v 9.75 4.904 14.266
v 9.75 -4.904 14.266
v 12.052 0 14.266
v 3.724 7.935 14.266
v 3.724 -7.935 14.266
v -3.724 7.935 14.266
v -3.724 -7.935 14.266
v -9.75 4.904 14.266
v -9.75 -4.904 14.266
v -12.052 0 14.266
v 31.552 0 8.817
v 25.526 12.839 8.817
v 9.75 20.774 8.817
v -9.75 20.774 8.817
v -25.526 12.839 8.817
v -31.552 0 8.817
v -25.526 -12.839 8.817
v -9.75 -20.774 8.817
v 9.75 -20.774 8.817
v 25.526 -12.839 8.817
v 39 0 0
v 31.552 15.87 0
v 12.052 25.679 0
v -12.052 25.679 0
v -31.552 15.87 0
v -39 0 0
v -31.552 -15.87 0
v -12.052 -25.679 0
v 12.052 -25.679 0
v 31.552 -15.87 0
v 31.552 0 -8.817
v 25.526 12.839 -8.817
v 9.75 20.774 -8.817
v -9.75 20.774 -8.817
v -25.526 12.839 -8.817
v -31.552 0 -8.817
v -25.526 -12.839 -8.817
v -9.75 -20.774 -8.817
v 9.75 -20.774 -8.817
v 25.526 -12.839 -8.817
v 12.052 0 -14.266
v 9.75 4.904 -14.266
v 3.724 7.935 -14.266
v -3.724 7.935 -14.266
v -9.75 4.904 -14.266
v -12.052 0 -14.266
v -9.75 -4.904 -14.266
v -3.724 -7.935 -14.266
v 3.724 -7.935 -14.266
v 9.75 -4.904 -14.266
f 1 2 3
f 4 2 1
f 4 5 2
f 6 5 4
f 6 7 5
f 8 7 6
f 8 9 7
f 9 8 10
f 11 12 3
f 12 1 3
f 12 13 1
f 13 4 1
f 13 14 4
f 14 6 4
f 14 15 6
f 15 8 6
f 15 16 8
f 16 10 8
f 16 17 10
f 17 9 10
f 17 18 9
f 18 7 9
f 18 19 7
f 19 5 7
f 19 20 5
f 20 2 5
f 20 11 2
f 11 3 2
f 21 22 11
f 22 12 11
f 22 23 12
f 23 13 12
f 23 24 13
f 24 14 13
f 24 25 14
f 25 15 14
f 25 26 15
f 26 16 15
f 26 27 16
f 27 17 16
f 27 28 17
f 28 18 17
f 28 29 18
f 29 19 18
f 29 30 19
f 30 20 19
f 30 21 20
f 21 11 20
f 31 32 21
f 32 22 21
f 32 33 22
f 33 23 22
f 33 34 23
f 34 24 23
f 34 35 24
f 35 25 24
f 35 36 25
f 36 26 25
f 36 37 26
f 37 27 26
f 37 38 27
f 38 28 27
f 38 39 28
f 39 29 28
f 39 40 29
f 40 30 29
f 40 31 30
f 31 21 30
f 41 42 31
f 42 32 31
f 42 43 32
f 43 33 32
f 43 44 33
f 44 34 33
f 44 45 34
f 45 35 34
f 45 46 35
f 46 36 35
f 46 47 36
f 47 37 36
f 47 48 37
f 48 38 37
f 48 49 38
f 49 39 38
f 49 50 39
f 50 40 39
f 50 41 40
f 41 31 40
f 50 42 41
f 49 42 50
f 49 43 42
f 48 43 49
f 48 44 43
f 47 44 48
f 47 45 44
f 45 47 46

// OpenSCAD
// Generated by SolidPython 1.0.1 on 2020-07-29 00:46:50


scale(v = [13, 9, 5]) {
	sphere(r = 3);
}
/***********************************************
*********      SolidPython code:      **********
************************************************
 
# import packages: SolidPython
from solid import *
from solid.utils import *
from itertools import chain, combinations, permutations


class Resize:

    def __init__(self, scad_file):
        self.scad_file = scad_file
        #self.scad_file = import_scad(scad_file)
        # cone/cylinder param:
        self.r1 = 0
        self.r2 = 0
        self.h = 0
        # rectangular prism param:
        self.w = 0
        self.l = 0
        # ellipse param:
        self.r = 0

    # import OpenScad code (file name corresponds to shape)


    # classify shape + parameters
    def assign(self, param1, param2, param3):
        if self.scad_file == 'cone.scad':
            self.r1 = param1
            self.r2 = param2
            self.h = param3
        elif self.scad_file == 'cylinder.scad':
            self.r1 = param1
            self.r2 = param2
            self.h = param3
        elif self.scad_file == 'rectangularPrism.scad':
            self.h = param1
            self.l = param2
            self.w = param3
        else:
            self.r = param1
            self.h = param2

    # resize parameters
    def iterate(self):
        x = range(3, 20, 2)
        i = 1
        if self.scad_file == 'cone.scad':
            tempList = list(permutations(x, 2))
            for temp in tempList:
                param1 = temp[0]
                param2 = temp[1]
                filepath = 'produced_scad_files/' + 'cone' + str(param1) + '_' + str(param2) + '_' + '.scad'
                scad_render_to_file(cylinder(h=param1, r1=param2, r2=0), filepath)

        elif self.scad_file == 'cylinder.scad':
            tempList = list(permutations(x, 3))
            for temp in tempList:
                param1 = temp[0]
                param2 = temp[1]
                filepath = 'produced_scad_files/' + 'cylinder' + str(param1) + '_' + str(param2) + '_' + '.scad'
                scad_render_to_file(cylinder(h=param1, r1=param2, r2=param2), filepath)

        elif self.scad_file == 'rectangularPrism.scad':
            tempList = list(permutations(x, 3))
            for temp in tempList:
                param1 = temp[0]
                param2 = temp[1]
                param3 = temp[2]
                filepath = 'produced_scad_files/' + 'rectangularPrism' + str(param1) + '_' + str(param2) + '_' + str(
                    param3) + '.scad'
                scad_render_to_file(cube(size=(param1, param2, param3)), filepath)

        elif self.scad_file == 'ellipse.scad':
            tempList = list(permutations(x, 4))
            for temp in tempList:
                param1 = temp[0]
                param2 = temp[1]
                param3 = temp[2]
                param4 = temp[3]
                filepath = 'produced_scad_files/' + 'ellipse' + str(param1) + '_' + str(param2) + '_' + str(param3) + '_' + str(param4) + '.scad'
                scad_render_to_file(scale([param1, param2, param3])(sphere(r=param4)), filepath)

    def render_to_scadfile(self):
        scad_render_to_file(scad, 'example.scad') 
 
************************************************/
